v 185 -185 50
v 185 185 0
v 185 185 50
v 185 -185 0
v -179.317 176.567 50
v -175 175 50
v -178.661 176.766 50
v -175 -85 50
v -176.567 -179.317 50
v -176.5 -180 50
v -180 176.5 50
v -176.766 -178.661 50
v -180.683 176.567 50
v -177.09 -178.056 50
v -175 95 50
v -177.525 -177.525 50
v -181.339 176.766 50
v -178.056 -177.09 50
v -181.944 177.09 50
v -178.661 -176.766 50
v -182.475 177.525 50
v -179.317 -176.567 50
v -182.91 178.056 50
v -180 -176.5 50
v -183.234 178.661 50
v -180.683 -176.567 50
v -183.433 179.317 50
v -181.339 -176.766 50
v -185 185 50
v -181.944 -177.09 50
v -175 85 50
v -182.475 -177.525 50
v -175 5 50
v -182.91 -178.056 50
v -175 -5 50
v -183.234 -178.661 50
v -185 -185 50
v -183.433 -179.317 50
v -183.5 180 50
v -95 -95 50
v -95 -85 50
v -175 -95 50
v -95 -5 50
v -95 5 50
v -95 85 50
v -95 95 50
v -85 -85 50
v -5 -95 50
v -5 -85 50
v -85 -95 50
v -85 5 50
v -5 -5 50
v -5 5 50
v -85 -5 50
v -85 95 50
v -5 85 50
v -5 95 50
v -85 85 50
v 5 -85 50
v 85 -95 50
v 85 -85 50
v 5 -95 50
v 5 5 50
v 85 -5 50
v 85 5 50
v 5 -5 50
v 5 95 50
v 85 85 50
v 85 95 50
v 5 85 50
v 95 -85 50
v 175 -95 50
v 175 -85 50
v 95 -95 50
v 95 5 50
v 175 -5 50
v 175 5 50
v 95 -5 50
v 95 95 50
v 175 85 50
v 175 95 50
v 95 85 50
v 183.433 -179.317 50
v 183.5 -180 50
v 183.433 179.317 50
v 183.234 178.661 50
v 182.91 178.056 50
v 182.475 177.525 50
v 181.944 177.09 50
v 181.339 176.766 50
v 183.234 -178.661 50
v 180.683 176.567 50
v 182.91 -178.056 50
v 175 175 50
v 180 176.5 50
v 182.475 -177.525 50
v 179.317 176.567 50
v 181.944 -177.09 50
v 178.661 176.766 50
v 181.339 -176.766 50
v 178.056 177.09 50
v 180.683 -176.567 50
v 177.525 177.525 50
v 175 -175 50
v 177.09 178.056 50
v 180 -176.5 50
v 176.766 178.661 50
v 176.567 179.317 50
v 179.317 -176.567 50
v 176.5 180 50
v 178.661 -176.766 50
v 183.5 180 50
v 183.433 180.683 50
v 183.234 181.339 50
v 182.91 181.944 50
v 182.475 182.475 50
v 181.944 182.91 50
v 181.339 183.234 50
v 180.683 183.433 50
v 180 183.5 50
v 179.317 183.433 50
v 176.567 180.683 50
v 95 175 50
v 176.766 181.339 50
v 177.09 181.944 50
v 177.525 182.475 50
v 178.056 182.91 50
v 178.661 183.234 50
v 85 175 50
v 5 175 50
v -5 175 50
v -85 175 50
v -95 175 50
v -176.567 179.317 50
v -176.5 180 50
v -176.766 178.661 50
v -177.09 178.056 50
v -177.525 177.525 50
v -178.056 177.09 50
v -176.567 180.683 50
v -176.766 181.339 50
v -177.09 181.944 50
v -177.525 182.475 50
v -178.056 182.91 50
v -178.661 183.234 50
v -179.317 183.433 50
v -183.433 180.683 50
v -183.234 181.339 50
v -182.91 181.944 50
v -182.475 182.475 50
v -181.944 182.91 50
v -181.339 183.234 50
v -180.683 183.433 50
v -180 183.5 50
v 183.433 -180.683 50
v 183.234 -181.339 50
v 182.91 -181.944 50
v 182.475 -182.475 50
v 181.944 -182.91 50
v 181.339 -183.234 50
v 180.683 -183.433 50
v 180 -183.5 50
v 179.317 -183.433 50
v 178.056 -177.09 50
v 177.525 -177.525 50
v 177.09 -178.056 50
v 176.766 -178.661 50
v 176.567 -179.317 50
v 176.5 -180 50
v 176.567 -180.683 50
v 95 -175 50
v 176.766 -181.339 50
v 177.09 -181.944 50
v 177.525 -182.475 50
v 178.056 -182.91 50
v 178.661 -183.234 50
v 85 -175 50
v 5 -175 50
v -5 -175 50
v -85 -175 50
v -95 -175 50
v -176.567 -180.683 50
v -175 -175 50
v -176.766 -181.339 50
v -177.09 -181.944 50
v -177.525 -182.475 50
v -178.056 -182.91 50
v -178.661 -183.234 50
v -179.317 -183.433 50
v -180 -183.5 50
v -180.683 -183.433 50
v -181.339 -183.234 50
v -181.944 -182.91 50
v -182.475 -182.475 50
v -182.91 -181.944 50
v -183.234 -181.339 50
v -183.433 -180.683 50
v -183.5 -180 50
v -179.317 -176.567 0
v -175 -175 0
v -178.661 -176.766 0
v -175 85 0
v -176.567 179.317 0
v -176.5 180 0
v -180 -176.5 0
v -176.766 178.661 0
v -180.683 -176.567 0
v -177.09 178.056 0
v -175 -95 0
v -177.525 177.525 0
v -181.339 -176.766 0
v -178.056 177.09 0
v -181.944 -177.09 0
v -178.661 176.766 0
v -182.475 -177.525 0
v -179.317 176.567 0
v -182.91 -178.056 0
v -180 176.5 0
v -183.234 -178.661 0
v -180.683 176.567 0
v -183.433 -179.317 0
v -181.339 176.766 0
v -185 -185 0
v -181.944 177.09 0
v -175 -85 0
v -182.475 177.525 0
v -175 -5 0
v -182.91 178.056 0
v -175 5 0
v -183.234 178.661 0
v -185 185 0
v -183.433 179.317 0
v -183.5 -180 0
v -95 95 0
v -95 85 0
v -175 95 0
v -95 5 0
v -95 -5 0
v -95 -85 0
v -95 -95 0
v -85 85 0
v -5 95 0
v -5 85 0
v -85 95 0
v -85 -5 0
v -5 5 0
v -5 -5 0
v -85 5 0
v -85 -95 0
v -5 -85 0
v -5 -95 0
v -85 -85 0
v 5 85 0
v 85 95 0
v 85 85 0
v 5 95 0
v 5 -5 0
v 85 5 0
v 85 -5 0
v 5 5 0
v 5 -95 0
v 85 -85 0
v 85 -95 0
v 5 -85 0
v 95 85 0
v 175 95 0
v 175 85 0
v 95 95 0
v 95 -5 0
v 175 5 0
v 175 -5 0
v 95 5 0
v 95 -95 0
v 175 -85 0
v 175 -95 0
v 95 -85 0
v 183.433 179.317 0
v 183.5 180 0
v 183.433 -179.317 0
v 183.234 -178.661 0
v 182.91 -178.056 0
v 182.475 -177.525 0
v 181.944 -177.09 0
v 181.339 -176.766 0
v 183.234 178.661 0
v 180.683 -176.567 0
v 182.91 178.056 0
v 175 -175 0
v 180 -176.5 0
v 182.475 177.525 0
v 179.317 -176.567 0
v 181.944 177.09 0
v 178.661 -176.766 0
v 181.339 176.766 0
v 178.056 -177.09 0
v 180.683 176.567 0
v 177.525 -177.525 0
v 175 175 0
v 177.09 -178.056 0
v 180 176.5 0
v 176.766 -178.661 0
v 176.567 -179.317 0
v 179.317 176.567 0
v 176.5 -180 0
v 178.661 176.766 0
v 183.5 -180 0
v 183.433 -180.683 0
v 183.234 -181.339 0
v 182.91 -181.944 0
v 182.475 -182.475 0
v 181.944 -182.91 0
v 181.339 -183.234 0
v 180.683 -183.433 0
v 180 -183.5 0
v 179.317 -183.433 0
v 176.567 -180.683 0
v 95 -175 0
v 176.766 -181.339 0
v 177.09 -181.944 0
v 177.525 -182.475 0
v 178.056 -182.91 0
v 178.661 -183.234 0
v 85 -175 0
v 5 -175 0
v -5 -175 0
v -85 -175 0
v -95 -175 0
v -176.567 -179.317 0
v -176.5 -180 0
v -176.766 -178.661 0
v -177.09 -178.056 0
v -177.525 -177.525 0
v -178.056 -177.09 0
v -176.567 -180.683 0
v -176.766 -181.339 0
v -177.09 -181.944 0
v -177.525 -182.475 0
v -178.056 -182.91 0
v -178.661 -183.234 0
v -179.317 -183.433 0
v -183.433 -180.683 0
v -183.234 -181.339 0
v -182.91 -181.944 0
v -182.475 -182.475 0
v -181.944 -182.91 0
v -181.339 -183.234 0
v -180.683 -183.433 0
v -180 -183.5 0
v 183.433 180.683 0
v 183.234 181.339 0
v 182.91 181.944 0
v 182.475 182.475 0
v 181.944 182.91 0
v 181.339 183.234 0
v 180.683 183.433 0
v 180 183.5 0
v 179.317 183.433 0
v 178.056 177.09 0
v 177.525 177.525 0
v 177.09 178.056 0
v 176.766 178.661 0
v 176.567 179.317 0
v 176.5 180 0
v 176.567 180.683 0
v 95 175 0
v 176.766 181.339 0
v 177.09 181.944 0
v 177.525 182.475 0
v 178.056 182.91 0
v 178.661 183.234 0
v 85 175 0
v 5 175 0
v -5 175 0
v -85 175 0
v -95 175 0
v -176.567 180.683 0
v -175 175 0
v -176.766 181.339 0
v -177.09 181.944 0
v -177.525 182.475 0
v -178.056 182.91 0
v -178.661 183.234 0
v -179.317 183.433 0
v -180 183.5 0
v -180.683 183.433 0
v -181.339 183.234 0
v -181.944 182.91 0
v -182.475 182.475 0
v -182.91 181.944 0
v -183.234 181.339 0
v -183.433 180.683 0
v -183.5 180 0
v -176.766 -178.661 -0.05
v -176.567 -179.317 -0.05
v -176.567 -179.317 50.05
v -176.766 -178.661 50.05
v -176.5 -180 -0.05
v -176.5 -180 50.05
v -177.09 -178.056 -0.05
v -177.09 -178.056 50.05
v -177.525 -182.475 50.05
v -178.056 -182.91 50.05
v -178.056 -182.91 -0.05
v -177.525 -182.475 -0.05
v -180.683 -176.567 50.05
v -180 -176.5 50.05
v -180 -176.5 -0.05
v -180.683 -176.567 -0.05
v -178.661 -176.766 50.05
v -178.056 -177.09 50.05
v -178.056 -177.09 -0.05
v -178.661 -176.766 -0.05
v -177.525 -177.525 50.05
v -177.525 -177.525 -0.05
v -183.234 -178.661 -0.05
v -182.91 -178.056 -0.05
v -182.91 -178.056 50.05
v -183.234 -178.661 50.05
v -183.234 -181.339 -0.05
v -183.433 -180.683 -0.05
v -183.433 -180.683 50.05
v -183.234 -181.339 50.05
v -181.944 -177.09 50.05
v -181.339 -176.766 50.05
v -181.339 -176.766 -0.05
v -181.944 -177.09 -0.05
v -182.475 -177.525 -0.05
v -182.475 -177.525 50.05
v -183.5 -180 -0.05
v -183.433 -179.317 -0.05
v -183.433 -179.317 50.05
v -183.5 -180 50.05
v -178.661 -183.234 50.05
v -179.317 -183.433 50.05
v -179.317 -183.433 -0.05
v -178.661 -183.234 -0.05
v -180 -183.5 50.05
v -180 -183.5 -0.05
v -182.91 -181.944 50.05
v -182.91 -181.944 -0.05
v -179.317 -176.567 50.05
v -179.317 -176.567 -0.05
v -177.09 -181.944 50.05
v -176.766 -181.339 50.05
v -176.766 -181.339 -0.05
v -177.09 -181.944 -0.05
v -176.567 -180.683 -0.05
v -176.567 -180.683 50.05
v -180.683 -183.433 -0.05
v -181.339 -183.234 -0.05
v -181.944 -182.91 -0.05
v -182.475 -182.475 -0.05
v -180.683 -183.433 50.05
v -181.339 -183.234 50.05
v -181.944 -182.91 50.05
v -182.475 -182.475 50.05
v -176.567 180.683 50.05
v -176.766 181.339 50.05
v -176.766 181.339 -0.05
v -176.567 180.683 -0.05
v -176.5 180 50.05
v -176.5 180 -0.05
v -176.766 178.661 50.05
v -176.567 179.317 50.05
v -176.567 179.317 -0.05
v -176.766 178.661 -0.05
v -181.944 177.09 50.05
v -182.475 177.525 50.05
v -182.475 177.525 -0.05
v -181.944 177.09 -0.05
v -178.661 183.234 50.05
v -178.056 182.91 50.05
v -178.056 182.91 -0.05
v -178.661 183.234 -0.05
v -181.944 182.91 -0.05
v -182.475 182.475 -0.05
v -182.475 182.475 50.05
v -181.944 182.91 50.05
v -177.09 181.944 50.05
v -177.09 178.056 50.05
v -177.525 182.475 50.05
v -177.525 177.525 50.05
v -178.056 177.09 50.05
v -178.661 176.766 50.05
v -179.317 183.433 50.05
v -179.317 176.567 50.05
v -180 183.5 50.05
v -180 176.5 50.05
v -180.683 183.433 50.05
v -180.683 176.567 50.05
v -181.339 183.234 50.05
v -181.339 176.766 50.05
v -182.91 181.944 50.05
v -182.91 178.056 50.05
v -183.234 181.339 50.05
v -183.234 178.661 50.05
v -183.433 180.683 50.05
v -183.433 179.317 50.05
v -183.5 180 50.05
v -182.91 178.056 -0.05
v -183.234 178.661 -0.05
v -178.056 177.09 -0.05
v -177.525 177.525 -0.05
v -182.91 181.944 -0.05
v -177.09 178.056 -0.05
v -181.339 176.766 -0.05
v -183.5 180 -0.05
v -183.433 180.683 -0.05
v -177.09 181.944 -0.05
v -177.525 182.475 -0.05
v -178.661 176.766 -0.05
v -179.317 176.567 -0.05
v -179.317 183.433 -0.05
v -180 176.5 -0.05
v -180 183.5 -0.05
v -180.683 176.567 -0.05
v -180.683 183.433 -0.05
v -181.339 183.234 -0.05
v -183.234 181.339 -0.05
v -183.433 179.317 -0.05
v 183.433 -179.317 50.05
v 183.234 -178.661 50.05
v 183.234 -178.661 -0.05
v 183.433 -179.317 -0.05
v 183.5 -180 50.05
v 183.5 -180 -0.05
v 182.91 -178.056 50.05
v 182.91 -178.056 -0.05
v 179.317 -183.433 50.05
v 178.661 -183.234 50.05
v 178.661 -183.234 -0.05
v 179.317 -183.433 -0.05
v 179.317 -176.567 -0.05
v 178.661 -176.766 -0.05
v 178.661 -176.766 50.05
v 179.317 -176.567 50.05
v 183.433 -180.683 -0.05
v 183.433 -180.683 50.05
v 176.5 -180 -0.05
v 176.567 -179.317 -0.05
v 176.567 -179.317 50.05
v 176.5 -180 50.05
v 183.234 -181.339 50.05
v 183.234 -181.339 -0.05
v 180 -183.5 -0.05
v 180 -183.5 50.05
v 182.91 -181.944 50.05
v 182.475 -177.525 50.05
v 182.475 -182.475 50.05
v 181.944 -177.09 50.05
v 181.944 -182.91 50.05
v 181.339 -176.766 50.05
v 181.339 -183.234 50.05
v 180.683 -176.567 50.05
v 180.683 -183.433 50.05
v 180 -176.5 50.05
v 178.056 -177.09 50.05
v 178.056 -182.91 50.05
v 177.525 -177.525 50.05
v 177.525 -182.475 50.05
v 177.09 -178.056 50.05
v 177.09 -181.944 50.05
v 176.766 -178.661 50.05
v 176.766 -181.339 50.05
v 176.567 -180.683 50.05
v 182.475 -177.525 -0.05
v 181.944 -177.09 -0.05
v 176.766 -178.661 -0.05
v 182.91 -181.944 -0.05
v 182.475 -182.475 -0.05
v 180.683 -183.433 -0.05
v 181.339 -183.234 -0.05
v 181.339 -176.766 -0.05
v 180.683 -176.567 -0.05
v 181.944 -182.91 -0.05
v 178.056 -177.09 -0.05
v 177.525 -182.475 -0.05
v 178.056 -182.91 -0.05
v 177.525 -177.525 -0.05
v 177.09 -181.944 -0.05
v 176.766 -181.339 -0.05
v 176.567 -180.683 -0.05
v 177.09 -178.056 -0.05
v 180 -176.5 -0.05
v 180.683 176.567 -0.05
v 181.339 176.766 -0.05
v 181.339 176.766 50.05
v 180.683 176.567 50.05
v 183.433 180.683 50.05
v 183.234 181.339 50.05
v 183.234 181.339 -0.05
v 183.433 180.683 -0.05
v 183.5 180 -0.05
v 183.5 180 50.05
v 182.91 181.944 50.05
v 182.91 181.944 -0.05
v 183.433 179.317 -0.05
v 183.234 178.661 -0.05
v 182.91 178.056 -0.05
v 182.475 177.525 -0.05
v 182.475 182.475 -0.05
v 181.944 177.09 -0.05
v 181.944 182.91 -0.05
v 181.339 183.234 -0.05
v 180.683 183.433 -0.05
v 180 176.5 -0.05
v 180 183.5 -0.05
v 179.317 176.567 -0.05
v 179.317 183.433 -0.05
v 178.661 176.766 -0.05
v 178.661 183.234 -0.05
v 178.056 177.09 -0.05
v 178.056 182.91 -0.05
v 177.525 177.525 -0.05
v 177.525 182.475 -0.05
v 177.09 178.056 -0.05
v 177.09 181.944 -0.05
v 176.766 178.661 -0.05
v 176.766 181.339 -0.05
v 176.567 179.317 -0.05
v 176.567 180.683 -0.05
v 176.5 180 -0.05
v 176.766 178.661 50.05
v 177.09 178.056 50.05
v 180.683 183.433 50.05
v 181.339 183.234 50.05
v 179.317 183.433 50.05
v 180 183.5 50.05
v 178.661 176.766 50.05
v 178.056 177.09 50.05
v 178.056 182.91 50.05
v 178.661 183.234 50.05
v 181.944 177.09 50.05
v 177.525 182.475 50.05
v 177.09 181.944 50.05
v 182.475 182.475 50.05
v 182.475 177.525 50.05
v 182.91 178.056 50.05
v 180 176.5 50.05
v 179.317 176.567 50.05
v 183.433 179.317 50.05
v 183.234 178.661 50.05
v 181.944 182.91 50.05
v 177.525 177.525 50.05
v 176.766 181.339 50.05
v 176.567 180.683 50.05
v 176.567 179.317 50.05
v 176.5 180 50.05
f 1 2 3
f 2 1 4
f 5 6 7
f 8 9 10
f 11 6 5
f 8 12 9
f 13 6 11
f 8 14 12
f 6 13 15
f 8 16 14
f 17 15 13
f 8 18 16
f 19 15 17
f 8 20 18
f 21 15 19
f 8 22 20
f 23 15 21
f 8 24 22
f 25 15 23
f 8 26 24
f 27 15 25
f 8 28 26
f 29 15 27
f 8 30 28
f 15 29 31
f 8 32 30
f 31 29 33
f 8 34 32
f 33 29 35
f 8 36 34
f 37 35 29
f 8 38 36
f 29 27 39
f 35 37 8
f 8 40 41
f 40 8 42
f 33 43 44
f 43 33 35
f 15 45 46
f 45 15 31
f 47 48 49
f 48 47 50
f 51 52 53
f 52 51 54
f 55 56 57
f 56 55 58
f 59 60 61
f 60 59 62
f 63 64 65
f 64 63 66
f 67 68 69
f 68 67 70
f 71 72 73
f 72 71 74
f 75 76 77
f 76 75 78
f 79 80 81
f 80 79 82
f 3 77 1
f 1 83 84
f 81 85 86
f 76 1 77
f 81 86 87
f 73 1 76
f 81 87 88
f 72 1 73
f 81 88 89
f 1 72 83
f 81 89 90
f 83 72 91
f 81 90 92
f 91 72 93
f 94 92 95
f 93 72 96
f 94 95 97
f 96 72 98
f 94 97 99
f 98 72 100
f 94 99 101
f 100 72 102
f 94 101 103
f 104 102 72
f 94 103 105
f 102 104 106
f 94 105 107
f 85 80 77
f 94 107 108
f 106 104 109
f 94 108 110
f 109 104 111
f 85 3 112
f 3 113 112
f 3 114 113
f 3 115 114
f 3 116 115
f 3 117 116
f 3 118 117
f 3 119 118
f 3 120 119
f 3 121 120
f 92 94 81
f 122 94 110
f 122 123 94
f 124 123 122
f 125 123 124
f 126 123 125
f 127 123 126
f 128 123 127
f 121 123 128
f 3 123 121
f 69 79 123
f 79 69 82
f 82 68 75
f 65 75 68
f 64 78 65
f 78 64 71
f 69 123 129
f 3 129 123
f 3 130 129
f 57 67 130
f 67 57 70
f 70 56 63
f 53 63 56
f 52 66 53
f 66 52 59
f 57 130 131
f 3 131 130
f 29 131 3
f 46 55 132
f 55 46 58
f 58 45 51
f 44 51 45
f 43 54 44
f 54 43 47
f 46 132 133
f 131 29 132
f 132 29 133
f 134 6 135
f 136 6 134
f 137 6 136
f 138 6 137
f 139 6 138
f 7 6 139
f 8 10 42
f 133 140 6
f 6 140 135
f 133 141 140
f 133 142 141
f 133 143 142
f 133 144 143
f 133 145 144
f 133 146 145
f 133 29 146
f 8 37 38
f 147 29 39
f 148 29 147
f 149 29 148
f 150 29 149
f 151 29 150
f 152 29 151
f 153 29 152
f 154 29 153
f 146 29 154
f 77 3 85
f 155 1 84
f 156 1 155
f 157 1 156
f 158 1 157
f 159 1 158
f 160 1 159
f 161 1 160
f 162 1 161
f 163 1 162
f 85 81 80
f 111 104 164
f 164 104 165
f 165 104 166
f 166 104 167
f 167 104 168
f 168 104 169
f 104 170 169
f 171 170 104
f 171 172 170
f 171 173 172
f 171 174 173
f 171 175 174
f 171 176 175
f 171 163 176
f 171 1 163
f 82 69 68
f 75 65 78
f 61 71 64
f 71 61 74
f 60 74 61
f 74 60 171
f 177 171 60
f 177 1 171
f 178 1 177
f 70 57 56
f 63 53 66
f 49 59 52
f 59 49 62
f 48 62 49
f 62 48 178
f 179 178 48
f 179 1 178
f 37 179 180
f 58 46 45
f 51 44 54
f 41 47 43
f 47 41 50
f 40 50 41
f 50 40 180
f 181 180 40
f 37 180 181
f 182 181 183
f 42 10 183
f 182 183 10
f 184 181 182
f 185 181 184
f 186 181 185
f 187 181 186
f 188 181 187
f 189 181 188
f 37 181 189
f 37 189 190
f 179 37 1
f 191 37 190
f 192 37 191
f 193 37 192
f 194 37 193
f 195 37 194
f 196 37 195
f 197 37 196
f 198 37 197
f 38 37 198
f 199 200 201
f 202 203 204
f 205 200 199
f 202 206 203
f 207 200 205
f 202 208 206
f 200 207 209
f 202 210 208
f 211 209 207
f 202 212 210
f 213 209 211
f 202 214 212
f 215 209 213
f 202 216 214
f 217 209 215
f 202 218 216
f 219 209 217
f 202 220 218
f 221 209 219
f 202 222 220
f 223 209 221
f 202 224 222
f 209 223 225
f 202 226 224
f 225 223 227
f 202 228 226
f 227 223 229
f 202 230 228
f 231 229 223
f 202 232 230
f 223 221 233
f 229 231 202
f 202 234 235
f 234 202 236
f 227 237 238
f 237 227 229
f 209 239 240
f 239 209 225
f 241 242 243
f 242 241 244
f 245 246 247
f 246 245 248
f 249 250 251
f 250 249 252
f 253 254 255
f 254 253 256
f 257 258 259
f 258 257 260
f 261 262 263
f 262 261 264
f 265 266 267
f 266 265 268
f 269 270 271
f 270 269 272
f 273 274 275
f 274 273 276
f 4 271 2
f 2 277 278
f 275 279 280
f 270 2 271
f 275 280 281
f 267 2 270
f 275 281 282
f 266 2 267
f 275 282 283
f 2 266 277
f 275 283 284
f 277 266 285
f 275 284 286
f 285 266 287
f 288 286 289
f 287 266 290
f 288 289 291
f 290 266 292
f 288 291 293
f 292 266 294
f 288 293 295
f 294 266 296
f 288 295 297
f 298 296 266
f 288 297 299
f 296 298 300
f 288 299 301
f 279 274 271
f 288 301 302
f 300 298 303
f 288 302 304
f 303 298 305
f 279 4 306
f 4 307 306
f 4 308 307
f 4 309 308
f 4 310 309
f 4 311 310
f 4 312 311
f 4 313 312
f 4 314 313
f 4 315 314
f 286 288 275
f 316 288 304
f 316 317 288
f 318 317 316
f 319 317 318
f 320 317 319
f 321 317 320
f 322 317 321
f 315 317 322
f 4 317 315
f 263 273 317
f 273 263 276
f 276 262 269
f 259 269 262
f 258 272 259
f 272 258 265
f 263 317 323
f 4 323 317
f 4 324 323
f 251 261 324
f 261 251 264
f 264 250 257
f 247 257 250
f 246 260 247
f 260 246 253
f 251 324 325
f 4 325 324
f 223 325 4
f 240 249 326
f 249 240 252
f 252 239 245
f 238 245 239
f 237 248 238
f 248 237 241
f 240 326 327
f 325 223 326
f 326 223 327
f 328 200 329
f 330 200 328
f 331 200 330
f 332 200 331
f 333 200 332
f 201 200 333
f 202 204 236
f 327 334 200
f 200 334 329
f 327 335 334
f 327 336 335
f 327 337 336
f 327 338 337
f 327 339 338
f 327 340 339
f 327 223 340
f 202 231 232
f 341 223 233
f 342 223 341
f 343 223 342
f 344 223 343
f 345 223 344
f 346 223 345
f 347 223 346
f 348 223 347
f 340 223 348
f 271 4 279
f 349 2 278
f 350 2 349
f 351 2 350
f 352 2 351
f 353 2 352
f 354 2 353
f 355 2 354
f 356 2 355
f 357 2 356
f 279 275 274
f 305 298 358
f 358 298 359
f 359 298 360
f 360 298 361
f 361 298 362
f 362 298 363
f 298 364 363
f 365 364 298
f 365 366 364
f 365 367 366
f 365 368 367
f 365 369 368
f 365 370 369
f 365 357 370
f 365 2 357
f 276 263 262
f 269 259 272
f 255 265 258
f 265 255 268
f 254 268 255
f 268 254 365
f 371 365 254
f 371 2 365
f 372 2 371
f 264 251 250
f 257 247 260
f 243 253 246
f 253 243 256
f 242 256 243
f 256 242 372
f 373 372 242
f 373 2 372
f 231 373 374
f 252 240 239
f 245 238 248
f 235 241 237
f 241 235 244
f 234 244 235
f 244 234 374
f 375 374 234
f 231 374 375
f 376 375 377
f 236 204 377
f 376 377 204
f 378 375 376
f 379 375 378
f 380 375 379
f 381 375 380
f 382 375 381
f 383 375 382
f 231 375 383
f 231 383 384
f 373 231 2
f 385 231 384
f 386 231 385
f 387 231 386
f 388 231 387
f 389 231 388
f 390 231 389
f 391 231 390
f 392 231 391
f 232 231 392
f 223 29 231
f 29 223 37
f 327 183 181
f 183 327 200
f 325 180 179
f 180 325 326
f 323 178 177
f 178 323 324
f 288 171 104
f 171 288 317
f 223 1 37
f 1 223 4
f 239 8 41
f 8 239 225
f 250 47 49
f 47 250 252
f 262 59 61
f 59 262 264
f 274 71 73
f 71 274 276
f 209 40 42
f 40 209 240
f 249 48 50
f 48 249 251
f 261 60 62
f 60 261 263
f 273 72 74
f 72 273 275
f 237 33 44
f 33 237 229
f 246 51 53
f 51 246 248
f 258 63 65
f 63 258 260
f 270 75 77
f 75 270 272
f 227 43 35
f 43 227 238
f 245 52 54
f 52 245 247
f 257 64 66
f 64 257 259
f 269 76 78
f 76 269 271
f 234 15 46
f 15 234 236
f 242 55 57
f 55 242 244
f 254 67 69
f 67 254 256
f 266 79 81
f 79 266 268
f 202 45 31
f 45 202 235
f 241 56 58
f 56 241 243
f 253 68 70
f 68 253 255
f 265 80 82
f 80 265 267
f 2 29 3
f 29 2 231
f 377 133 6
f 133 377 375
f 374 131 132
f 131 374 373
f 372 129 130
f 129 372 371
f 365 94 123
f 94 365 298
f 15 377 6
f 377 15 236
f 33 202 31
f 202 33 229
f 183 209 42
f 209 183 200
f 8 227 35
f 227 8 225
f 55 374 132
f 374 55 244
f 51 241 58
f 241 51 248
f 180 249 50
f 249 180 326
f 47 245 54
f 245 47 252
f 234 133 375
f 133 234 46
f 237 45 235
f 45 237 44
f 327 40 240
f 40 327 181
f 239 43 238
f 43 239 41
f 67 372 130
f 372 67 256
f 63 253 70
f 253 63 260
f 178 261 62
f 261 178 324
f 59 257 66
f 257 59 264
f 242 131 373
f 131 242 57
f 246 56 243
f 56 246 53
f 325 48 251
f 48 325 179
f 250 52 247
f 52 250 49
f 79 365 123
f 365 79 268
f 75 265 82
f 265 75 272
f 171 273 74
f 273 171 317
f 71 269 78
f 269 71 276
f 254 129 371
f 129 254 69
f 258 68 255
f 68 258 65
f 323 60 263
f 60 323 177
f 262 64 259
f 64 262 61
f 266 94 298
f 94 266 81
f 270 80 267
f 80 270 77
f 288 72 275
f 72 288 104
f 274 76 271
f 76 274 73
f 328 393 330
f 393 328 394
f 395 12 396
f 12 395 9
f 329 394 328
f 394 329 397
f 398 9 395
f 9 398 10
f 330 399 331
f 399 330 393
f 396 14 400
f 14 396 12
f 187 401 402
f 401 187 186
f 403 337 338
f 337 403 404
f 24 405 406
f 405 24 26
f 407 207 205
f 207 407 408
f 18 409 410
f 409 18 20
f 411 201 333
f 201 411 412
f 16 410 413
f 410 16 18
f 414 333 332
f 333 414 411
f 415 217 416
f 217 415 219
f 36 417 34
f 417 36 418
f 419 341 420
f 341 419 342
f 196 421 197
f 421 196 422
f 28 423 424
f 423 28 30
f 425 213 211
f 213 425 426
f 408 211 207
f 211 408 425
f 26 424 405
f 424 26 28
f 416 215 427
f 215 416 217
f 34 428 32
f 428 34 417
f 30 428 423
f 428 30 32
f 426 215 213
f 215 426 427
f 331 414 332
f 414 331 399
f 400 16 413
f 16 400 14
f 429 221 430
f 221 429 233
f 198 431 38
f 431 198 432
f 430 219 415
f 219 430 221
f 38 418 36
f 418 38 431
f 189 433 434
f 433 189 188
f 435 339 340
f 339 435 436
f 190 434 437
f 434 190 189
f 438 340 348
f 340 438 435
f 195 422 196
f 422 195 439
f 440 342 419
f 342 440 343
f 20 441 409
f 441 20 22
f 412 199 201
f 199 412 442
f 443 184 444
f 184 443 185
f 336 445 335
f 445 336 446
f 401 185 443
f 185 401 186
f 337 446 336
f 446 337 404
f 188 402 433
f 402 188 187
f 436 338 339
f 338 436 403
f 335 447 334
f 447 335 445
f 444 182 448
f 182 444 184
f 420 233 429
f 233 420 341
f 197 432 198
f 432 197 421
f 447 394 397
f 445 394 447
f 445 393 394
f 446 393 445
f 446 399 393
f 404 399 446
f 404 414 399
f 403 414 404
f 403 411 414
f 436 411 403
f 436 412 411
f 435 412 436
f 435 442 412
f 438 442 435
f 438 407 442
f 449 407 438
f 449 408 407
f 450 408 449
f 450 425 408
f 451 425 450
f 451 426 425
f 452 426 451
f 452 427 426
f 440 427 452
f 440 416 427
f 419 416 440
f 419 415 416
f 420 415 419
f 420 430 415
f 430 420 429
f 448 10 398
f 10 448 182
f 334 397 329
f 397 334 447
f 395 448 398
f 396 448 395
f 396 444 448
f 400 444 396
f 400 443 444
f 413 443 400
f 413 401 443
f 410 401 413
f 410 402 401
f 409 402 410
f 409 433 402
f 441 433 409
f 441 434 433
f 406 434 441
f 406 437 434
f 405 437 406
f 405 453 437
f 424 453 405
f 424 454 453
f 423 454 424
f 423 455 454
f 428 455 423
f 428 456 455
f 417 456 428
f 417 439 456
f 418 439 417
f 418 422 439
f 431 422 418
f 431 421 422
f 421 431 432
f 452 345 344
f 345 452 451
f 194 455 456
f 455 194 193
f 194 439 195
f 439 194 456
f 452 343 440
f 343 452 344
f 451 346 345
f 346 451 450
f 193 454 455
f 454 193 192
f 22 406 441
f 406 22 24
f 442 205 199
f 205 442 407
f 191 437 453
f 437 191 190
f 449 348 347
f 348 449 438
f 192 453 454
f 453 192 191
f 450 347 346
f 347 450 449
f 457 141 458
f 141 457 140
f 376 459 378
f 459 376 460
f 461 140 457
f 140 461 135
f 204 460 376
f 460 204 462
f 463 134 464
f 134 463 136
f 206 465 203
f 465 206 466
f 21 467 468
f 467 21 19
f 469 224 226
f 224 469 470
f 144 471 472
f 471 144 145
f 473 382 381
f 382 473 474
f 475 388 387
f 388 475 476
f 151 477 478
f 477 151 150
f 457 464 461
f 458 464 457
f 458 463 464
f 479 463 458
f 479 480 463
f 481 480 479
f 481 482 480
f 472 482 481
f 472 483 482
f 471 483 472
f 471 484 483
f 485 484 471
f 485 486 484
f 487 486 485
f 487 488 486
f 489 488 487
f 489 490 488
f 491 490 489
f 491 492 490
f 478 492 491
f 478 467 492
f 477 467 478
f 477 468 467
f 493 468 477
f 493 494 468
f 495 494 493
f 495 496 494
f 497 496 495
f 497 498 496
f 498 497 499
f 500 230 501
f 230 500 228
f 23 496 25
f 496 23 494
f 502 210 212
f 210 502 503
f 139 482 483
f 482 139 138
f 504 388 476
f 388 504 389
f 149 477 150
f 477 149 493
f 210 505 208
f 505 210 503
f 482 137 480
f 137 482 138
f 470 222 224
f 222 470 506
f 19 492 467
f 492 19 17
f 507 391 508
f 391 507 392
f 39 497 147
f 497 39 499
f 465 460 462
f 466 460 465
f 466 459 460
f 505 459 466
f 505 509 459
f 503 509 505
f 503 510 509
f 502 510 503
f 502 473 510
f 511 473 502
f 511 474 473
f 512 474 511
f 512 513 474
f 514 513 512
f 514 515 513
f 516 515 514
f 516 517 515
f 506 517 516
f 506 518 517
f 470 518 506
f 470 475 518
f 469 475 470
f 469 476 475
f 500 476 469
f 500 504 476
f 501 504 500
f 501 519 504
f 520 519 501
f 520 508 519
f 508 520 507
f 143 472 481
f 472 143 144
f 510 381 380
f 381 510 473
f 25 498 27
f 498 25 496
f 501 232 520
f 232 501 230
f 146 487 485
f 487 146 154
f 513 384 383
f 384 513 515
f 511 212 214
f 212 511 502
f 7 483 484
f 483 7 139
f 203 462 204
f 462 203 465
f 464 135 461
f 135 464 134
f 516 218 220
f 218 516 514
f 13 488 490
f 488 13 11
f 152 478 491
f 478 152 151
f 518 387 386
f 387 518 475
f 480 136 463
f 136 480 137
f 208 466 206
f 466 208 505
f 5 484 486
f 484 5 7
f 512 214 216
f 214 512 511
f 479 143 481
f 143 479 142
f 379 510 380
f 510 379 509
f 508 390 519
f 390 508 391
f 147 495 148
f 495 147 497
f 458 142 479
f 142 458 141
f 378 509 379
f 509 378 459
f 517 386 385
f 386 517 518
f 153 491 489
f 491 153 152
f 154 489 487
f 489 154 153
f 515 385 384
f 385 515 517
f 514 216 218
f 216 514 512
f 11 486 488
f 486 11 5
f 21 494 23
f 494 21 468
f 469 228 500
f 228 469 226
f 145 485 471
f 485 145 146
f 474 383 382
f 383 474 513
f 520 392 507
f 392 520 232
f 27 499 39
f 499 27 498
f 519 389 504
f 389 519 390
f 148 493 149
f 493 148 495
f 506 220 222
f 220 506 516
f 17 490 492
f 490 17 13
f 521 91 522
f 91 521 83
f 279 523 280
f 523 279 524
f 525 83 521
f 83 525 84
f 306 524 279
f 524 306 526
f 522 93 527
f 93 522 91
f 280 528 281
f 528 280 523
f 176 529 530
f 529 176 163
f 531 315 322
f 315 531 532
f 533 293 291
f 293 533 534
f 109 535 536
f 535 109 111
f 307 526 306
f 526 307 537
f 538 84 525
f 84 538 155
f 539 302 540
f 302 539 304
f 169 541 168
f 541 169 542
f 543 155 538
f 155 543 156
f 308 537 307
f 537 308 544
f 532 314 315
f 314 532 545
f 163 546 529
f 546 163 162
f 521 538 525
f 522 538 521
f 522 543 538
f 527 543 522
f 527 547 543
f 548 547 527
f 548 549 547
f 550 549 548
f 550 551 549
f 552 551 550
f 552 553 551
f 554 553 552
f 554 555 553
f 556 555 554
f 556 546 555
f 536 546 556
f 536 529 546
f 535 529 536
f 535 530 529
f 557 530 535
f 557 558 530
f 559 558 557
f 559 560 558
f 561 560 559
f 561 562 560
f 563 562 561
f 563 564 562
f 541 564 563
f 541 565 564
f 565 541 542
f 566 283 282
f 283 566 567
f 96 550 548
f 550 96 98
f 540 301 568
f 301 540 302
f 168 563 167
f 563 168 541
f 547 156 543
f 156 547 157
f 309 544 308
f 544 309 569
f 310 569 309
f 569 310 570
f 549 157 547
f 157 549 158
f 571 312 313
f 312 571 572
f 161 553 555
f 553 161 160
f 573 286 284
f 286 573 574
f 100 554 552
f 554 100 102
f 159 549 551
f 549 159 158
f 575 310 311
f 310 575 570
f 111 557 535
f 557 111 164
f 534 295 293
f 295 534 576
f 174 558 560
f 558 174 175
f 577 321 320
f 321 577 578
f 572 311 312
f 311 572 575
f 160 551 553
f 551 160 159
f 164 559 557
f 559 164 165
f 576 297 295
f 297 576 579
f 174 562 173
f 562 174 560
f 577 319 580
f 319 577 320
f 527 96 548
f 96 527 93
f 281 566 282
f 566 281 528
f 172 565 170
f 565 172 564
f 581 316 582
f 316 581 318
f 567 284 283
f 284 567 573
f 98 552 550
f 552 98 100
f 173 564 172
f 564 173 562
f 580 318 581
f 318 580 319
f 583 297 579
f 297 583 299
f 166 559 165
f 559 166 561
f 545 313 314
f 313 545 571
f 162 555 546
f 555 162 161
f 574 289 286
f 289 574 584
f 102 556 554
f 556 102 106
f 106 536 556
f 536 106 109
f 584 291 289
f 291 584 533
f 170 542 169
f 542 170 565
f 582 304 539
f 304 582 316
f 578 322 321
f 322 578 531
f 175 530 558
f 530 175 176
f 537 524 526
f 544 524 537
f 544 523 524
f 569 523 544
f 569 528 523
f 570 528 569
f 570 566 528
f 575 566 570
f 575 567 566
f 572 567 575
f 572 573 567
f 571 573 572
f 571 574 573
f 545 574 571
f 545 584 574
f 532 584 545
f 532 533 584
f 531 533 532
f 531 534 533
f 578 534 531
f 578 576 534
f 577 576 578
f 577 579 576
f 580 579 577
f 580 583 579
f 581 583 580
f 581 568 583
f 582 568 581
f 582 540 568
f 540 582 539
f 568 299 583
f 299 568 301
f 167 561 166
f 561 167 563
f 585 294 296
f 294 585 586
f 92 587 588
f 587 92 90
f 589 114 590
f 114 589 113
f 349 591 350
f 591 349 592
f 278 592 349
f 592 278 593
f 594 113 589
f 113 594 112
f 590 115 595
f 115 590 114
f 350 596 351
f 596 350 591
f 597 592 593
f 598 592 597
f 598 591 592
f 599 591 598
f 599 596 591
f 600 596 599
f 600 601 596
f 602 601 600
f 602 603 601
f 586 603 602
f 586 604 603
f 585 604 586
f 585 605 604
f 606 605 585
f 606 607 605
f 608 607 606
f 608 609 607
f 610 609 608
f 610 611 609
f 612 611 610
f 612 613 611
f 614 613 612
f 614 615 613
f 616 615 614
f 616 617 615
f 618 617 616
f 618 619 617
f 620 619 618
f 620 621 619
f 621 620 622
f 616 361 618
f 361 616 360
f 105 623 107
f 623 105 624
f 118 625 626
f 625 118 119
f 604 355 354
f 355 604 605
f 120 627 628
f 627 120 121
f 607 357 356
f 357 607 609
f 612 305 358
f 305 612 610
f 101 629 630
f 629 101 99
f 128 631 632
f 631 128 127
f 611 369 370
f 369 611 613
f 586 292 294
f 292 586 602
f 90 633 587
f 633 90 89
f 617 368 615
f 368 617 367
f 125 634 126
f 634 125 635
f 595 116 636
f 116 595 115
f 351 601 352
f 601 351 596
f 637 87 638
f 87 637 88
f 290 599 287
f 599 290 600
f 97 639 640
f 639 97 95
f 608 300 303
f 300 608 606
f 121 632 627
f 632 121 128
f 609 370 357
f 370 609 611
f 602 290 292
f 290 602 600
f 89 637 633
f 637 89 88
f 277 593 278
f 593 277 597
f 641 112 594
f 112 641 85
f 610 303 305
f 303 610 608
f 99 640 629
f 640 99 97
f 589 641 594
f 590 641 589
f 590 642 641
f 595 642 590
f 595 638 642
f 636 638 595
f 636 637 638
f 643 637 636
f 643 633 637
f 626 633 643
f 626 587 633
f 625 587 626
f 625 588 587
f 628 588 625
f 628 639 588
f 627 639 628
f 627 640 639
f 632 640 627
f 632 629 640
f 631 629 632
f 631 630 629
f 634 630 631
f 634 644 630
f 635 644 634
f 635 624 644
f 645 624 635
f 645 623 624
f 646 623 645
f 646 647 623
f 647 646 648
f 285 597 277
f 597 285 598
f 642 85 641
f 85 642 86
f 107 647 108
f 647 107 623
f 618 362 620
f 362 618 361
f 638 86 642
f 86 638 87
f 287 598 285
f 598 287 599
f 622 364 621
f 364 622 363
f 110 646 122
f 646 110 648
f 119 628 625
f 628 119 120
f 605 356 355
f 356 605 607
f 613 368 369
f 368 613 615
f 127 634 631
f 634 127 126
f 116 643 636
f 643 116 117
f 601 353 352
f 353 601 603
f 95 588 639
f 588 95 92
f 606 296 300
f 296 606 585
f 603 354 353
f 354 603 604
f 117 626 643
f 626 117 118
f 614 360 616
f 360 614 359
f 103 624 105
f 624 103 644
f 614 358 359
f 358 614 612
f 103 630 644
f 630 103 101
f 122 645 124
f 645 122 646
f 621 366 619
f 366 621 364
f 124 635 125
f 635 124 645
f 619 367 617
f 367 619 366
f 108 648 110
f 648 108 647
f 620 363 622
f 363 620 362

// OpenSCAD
// Part Name: Cage_Layer_10_H50mm
// This part represents a horizontal slice of the cage.
// It is designed to be 3D printed on its base.

// Parameters for the cage
bar_t = 10;
gap_xy = 80;
hole_d = 7;
cage_ext_xy = 370;

// Calculate bar center positions relative to the overall cage center
bar_centers_xy = [for (j = [0:4]) (-cage_ext_xy/2 + bar_t/2 + j * (bar_t + gap_xy))];

// Module to generate a single layer segment
module cage_layer_segment(height) {
    // Offset for printing on z=0 plane. The module itself is centered on XY=0, so this Z offset moves its base to Z=0.
    translate([0, 0, height/2]) {
        union() {
            // Horizontal bars (along X)
            for (y_center = bar_centers_xy) {
                translate([0, y_center, 0])
                cube([cage_ext_xy, bar_t, height], center = true);
            }

            // Vertical bars (along Y)
            for (x_center = bar_centers_xy) {
                translate([x_center, 0, 0])
                cube([bar_t, cage_ext_xy, height], center = true);
            }

            // Subtract holes for M6 rods at the 4 corners
            corner_offsets_xy = [bar_centers_xy[0], bar_centers_xy[4]];

            for (x_offset = corner_offsets_xy) {
                for (y_offset = corner_offsets_xy) {
                    // Hole through the center of the corner bar
                    translate([x_offset, y_offset, 0])
                    cylinder(h = height + 0.1, d = hole_d, center = true, $fn=32); // +0.1 for clean cut
                }
            }
        }
    }
}

// Render the segment
cage_layer_segment(50);
